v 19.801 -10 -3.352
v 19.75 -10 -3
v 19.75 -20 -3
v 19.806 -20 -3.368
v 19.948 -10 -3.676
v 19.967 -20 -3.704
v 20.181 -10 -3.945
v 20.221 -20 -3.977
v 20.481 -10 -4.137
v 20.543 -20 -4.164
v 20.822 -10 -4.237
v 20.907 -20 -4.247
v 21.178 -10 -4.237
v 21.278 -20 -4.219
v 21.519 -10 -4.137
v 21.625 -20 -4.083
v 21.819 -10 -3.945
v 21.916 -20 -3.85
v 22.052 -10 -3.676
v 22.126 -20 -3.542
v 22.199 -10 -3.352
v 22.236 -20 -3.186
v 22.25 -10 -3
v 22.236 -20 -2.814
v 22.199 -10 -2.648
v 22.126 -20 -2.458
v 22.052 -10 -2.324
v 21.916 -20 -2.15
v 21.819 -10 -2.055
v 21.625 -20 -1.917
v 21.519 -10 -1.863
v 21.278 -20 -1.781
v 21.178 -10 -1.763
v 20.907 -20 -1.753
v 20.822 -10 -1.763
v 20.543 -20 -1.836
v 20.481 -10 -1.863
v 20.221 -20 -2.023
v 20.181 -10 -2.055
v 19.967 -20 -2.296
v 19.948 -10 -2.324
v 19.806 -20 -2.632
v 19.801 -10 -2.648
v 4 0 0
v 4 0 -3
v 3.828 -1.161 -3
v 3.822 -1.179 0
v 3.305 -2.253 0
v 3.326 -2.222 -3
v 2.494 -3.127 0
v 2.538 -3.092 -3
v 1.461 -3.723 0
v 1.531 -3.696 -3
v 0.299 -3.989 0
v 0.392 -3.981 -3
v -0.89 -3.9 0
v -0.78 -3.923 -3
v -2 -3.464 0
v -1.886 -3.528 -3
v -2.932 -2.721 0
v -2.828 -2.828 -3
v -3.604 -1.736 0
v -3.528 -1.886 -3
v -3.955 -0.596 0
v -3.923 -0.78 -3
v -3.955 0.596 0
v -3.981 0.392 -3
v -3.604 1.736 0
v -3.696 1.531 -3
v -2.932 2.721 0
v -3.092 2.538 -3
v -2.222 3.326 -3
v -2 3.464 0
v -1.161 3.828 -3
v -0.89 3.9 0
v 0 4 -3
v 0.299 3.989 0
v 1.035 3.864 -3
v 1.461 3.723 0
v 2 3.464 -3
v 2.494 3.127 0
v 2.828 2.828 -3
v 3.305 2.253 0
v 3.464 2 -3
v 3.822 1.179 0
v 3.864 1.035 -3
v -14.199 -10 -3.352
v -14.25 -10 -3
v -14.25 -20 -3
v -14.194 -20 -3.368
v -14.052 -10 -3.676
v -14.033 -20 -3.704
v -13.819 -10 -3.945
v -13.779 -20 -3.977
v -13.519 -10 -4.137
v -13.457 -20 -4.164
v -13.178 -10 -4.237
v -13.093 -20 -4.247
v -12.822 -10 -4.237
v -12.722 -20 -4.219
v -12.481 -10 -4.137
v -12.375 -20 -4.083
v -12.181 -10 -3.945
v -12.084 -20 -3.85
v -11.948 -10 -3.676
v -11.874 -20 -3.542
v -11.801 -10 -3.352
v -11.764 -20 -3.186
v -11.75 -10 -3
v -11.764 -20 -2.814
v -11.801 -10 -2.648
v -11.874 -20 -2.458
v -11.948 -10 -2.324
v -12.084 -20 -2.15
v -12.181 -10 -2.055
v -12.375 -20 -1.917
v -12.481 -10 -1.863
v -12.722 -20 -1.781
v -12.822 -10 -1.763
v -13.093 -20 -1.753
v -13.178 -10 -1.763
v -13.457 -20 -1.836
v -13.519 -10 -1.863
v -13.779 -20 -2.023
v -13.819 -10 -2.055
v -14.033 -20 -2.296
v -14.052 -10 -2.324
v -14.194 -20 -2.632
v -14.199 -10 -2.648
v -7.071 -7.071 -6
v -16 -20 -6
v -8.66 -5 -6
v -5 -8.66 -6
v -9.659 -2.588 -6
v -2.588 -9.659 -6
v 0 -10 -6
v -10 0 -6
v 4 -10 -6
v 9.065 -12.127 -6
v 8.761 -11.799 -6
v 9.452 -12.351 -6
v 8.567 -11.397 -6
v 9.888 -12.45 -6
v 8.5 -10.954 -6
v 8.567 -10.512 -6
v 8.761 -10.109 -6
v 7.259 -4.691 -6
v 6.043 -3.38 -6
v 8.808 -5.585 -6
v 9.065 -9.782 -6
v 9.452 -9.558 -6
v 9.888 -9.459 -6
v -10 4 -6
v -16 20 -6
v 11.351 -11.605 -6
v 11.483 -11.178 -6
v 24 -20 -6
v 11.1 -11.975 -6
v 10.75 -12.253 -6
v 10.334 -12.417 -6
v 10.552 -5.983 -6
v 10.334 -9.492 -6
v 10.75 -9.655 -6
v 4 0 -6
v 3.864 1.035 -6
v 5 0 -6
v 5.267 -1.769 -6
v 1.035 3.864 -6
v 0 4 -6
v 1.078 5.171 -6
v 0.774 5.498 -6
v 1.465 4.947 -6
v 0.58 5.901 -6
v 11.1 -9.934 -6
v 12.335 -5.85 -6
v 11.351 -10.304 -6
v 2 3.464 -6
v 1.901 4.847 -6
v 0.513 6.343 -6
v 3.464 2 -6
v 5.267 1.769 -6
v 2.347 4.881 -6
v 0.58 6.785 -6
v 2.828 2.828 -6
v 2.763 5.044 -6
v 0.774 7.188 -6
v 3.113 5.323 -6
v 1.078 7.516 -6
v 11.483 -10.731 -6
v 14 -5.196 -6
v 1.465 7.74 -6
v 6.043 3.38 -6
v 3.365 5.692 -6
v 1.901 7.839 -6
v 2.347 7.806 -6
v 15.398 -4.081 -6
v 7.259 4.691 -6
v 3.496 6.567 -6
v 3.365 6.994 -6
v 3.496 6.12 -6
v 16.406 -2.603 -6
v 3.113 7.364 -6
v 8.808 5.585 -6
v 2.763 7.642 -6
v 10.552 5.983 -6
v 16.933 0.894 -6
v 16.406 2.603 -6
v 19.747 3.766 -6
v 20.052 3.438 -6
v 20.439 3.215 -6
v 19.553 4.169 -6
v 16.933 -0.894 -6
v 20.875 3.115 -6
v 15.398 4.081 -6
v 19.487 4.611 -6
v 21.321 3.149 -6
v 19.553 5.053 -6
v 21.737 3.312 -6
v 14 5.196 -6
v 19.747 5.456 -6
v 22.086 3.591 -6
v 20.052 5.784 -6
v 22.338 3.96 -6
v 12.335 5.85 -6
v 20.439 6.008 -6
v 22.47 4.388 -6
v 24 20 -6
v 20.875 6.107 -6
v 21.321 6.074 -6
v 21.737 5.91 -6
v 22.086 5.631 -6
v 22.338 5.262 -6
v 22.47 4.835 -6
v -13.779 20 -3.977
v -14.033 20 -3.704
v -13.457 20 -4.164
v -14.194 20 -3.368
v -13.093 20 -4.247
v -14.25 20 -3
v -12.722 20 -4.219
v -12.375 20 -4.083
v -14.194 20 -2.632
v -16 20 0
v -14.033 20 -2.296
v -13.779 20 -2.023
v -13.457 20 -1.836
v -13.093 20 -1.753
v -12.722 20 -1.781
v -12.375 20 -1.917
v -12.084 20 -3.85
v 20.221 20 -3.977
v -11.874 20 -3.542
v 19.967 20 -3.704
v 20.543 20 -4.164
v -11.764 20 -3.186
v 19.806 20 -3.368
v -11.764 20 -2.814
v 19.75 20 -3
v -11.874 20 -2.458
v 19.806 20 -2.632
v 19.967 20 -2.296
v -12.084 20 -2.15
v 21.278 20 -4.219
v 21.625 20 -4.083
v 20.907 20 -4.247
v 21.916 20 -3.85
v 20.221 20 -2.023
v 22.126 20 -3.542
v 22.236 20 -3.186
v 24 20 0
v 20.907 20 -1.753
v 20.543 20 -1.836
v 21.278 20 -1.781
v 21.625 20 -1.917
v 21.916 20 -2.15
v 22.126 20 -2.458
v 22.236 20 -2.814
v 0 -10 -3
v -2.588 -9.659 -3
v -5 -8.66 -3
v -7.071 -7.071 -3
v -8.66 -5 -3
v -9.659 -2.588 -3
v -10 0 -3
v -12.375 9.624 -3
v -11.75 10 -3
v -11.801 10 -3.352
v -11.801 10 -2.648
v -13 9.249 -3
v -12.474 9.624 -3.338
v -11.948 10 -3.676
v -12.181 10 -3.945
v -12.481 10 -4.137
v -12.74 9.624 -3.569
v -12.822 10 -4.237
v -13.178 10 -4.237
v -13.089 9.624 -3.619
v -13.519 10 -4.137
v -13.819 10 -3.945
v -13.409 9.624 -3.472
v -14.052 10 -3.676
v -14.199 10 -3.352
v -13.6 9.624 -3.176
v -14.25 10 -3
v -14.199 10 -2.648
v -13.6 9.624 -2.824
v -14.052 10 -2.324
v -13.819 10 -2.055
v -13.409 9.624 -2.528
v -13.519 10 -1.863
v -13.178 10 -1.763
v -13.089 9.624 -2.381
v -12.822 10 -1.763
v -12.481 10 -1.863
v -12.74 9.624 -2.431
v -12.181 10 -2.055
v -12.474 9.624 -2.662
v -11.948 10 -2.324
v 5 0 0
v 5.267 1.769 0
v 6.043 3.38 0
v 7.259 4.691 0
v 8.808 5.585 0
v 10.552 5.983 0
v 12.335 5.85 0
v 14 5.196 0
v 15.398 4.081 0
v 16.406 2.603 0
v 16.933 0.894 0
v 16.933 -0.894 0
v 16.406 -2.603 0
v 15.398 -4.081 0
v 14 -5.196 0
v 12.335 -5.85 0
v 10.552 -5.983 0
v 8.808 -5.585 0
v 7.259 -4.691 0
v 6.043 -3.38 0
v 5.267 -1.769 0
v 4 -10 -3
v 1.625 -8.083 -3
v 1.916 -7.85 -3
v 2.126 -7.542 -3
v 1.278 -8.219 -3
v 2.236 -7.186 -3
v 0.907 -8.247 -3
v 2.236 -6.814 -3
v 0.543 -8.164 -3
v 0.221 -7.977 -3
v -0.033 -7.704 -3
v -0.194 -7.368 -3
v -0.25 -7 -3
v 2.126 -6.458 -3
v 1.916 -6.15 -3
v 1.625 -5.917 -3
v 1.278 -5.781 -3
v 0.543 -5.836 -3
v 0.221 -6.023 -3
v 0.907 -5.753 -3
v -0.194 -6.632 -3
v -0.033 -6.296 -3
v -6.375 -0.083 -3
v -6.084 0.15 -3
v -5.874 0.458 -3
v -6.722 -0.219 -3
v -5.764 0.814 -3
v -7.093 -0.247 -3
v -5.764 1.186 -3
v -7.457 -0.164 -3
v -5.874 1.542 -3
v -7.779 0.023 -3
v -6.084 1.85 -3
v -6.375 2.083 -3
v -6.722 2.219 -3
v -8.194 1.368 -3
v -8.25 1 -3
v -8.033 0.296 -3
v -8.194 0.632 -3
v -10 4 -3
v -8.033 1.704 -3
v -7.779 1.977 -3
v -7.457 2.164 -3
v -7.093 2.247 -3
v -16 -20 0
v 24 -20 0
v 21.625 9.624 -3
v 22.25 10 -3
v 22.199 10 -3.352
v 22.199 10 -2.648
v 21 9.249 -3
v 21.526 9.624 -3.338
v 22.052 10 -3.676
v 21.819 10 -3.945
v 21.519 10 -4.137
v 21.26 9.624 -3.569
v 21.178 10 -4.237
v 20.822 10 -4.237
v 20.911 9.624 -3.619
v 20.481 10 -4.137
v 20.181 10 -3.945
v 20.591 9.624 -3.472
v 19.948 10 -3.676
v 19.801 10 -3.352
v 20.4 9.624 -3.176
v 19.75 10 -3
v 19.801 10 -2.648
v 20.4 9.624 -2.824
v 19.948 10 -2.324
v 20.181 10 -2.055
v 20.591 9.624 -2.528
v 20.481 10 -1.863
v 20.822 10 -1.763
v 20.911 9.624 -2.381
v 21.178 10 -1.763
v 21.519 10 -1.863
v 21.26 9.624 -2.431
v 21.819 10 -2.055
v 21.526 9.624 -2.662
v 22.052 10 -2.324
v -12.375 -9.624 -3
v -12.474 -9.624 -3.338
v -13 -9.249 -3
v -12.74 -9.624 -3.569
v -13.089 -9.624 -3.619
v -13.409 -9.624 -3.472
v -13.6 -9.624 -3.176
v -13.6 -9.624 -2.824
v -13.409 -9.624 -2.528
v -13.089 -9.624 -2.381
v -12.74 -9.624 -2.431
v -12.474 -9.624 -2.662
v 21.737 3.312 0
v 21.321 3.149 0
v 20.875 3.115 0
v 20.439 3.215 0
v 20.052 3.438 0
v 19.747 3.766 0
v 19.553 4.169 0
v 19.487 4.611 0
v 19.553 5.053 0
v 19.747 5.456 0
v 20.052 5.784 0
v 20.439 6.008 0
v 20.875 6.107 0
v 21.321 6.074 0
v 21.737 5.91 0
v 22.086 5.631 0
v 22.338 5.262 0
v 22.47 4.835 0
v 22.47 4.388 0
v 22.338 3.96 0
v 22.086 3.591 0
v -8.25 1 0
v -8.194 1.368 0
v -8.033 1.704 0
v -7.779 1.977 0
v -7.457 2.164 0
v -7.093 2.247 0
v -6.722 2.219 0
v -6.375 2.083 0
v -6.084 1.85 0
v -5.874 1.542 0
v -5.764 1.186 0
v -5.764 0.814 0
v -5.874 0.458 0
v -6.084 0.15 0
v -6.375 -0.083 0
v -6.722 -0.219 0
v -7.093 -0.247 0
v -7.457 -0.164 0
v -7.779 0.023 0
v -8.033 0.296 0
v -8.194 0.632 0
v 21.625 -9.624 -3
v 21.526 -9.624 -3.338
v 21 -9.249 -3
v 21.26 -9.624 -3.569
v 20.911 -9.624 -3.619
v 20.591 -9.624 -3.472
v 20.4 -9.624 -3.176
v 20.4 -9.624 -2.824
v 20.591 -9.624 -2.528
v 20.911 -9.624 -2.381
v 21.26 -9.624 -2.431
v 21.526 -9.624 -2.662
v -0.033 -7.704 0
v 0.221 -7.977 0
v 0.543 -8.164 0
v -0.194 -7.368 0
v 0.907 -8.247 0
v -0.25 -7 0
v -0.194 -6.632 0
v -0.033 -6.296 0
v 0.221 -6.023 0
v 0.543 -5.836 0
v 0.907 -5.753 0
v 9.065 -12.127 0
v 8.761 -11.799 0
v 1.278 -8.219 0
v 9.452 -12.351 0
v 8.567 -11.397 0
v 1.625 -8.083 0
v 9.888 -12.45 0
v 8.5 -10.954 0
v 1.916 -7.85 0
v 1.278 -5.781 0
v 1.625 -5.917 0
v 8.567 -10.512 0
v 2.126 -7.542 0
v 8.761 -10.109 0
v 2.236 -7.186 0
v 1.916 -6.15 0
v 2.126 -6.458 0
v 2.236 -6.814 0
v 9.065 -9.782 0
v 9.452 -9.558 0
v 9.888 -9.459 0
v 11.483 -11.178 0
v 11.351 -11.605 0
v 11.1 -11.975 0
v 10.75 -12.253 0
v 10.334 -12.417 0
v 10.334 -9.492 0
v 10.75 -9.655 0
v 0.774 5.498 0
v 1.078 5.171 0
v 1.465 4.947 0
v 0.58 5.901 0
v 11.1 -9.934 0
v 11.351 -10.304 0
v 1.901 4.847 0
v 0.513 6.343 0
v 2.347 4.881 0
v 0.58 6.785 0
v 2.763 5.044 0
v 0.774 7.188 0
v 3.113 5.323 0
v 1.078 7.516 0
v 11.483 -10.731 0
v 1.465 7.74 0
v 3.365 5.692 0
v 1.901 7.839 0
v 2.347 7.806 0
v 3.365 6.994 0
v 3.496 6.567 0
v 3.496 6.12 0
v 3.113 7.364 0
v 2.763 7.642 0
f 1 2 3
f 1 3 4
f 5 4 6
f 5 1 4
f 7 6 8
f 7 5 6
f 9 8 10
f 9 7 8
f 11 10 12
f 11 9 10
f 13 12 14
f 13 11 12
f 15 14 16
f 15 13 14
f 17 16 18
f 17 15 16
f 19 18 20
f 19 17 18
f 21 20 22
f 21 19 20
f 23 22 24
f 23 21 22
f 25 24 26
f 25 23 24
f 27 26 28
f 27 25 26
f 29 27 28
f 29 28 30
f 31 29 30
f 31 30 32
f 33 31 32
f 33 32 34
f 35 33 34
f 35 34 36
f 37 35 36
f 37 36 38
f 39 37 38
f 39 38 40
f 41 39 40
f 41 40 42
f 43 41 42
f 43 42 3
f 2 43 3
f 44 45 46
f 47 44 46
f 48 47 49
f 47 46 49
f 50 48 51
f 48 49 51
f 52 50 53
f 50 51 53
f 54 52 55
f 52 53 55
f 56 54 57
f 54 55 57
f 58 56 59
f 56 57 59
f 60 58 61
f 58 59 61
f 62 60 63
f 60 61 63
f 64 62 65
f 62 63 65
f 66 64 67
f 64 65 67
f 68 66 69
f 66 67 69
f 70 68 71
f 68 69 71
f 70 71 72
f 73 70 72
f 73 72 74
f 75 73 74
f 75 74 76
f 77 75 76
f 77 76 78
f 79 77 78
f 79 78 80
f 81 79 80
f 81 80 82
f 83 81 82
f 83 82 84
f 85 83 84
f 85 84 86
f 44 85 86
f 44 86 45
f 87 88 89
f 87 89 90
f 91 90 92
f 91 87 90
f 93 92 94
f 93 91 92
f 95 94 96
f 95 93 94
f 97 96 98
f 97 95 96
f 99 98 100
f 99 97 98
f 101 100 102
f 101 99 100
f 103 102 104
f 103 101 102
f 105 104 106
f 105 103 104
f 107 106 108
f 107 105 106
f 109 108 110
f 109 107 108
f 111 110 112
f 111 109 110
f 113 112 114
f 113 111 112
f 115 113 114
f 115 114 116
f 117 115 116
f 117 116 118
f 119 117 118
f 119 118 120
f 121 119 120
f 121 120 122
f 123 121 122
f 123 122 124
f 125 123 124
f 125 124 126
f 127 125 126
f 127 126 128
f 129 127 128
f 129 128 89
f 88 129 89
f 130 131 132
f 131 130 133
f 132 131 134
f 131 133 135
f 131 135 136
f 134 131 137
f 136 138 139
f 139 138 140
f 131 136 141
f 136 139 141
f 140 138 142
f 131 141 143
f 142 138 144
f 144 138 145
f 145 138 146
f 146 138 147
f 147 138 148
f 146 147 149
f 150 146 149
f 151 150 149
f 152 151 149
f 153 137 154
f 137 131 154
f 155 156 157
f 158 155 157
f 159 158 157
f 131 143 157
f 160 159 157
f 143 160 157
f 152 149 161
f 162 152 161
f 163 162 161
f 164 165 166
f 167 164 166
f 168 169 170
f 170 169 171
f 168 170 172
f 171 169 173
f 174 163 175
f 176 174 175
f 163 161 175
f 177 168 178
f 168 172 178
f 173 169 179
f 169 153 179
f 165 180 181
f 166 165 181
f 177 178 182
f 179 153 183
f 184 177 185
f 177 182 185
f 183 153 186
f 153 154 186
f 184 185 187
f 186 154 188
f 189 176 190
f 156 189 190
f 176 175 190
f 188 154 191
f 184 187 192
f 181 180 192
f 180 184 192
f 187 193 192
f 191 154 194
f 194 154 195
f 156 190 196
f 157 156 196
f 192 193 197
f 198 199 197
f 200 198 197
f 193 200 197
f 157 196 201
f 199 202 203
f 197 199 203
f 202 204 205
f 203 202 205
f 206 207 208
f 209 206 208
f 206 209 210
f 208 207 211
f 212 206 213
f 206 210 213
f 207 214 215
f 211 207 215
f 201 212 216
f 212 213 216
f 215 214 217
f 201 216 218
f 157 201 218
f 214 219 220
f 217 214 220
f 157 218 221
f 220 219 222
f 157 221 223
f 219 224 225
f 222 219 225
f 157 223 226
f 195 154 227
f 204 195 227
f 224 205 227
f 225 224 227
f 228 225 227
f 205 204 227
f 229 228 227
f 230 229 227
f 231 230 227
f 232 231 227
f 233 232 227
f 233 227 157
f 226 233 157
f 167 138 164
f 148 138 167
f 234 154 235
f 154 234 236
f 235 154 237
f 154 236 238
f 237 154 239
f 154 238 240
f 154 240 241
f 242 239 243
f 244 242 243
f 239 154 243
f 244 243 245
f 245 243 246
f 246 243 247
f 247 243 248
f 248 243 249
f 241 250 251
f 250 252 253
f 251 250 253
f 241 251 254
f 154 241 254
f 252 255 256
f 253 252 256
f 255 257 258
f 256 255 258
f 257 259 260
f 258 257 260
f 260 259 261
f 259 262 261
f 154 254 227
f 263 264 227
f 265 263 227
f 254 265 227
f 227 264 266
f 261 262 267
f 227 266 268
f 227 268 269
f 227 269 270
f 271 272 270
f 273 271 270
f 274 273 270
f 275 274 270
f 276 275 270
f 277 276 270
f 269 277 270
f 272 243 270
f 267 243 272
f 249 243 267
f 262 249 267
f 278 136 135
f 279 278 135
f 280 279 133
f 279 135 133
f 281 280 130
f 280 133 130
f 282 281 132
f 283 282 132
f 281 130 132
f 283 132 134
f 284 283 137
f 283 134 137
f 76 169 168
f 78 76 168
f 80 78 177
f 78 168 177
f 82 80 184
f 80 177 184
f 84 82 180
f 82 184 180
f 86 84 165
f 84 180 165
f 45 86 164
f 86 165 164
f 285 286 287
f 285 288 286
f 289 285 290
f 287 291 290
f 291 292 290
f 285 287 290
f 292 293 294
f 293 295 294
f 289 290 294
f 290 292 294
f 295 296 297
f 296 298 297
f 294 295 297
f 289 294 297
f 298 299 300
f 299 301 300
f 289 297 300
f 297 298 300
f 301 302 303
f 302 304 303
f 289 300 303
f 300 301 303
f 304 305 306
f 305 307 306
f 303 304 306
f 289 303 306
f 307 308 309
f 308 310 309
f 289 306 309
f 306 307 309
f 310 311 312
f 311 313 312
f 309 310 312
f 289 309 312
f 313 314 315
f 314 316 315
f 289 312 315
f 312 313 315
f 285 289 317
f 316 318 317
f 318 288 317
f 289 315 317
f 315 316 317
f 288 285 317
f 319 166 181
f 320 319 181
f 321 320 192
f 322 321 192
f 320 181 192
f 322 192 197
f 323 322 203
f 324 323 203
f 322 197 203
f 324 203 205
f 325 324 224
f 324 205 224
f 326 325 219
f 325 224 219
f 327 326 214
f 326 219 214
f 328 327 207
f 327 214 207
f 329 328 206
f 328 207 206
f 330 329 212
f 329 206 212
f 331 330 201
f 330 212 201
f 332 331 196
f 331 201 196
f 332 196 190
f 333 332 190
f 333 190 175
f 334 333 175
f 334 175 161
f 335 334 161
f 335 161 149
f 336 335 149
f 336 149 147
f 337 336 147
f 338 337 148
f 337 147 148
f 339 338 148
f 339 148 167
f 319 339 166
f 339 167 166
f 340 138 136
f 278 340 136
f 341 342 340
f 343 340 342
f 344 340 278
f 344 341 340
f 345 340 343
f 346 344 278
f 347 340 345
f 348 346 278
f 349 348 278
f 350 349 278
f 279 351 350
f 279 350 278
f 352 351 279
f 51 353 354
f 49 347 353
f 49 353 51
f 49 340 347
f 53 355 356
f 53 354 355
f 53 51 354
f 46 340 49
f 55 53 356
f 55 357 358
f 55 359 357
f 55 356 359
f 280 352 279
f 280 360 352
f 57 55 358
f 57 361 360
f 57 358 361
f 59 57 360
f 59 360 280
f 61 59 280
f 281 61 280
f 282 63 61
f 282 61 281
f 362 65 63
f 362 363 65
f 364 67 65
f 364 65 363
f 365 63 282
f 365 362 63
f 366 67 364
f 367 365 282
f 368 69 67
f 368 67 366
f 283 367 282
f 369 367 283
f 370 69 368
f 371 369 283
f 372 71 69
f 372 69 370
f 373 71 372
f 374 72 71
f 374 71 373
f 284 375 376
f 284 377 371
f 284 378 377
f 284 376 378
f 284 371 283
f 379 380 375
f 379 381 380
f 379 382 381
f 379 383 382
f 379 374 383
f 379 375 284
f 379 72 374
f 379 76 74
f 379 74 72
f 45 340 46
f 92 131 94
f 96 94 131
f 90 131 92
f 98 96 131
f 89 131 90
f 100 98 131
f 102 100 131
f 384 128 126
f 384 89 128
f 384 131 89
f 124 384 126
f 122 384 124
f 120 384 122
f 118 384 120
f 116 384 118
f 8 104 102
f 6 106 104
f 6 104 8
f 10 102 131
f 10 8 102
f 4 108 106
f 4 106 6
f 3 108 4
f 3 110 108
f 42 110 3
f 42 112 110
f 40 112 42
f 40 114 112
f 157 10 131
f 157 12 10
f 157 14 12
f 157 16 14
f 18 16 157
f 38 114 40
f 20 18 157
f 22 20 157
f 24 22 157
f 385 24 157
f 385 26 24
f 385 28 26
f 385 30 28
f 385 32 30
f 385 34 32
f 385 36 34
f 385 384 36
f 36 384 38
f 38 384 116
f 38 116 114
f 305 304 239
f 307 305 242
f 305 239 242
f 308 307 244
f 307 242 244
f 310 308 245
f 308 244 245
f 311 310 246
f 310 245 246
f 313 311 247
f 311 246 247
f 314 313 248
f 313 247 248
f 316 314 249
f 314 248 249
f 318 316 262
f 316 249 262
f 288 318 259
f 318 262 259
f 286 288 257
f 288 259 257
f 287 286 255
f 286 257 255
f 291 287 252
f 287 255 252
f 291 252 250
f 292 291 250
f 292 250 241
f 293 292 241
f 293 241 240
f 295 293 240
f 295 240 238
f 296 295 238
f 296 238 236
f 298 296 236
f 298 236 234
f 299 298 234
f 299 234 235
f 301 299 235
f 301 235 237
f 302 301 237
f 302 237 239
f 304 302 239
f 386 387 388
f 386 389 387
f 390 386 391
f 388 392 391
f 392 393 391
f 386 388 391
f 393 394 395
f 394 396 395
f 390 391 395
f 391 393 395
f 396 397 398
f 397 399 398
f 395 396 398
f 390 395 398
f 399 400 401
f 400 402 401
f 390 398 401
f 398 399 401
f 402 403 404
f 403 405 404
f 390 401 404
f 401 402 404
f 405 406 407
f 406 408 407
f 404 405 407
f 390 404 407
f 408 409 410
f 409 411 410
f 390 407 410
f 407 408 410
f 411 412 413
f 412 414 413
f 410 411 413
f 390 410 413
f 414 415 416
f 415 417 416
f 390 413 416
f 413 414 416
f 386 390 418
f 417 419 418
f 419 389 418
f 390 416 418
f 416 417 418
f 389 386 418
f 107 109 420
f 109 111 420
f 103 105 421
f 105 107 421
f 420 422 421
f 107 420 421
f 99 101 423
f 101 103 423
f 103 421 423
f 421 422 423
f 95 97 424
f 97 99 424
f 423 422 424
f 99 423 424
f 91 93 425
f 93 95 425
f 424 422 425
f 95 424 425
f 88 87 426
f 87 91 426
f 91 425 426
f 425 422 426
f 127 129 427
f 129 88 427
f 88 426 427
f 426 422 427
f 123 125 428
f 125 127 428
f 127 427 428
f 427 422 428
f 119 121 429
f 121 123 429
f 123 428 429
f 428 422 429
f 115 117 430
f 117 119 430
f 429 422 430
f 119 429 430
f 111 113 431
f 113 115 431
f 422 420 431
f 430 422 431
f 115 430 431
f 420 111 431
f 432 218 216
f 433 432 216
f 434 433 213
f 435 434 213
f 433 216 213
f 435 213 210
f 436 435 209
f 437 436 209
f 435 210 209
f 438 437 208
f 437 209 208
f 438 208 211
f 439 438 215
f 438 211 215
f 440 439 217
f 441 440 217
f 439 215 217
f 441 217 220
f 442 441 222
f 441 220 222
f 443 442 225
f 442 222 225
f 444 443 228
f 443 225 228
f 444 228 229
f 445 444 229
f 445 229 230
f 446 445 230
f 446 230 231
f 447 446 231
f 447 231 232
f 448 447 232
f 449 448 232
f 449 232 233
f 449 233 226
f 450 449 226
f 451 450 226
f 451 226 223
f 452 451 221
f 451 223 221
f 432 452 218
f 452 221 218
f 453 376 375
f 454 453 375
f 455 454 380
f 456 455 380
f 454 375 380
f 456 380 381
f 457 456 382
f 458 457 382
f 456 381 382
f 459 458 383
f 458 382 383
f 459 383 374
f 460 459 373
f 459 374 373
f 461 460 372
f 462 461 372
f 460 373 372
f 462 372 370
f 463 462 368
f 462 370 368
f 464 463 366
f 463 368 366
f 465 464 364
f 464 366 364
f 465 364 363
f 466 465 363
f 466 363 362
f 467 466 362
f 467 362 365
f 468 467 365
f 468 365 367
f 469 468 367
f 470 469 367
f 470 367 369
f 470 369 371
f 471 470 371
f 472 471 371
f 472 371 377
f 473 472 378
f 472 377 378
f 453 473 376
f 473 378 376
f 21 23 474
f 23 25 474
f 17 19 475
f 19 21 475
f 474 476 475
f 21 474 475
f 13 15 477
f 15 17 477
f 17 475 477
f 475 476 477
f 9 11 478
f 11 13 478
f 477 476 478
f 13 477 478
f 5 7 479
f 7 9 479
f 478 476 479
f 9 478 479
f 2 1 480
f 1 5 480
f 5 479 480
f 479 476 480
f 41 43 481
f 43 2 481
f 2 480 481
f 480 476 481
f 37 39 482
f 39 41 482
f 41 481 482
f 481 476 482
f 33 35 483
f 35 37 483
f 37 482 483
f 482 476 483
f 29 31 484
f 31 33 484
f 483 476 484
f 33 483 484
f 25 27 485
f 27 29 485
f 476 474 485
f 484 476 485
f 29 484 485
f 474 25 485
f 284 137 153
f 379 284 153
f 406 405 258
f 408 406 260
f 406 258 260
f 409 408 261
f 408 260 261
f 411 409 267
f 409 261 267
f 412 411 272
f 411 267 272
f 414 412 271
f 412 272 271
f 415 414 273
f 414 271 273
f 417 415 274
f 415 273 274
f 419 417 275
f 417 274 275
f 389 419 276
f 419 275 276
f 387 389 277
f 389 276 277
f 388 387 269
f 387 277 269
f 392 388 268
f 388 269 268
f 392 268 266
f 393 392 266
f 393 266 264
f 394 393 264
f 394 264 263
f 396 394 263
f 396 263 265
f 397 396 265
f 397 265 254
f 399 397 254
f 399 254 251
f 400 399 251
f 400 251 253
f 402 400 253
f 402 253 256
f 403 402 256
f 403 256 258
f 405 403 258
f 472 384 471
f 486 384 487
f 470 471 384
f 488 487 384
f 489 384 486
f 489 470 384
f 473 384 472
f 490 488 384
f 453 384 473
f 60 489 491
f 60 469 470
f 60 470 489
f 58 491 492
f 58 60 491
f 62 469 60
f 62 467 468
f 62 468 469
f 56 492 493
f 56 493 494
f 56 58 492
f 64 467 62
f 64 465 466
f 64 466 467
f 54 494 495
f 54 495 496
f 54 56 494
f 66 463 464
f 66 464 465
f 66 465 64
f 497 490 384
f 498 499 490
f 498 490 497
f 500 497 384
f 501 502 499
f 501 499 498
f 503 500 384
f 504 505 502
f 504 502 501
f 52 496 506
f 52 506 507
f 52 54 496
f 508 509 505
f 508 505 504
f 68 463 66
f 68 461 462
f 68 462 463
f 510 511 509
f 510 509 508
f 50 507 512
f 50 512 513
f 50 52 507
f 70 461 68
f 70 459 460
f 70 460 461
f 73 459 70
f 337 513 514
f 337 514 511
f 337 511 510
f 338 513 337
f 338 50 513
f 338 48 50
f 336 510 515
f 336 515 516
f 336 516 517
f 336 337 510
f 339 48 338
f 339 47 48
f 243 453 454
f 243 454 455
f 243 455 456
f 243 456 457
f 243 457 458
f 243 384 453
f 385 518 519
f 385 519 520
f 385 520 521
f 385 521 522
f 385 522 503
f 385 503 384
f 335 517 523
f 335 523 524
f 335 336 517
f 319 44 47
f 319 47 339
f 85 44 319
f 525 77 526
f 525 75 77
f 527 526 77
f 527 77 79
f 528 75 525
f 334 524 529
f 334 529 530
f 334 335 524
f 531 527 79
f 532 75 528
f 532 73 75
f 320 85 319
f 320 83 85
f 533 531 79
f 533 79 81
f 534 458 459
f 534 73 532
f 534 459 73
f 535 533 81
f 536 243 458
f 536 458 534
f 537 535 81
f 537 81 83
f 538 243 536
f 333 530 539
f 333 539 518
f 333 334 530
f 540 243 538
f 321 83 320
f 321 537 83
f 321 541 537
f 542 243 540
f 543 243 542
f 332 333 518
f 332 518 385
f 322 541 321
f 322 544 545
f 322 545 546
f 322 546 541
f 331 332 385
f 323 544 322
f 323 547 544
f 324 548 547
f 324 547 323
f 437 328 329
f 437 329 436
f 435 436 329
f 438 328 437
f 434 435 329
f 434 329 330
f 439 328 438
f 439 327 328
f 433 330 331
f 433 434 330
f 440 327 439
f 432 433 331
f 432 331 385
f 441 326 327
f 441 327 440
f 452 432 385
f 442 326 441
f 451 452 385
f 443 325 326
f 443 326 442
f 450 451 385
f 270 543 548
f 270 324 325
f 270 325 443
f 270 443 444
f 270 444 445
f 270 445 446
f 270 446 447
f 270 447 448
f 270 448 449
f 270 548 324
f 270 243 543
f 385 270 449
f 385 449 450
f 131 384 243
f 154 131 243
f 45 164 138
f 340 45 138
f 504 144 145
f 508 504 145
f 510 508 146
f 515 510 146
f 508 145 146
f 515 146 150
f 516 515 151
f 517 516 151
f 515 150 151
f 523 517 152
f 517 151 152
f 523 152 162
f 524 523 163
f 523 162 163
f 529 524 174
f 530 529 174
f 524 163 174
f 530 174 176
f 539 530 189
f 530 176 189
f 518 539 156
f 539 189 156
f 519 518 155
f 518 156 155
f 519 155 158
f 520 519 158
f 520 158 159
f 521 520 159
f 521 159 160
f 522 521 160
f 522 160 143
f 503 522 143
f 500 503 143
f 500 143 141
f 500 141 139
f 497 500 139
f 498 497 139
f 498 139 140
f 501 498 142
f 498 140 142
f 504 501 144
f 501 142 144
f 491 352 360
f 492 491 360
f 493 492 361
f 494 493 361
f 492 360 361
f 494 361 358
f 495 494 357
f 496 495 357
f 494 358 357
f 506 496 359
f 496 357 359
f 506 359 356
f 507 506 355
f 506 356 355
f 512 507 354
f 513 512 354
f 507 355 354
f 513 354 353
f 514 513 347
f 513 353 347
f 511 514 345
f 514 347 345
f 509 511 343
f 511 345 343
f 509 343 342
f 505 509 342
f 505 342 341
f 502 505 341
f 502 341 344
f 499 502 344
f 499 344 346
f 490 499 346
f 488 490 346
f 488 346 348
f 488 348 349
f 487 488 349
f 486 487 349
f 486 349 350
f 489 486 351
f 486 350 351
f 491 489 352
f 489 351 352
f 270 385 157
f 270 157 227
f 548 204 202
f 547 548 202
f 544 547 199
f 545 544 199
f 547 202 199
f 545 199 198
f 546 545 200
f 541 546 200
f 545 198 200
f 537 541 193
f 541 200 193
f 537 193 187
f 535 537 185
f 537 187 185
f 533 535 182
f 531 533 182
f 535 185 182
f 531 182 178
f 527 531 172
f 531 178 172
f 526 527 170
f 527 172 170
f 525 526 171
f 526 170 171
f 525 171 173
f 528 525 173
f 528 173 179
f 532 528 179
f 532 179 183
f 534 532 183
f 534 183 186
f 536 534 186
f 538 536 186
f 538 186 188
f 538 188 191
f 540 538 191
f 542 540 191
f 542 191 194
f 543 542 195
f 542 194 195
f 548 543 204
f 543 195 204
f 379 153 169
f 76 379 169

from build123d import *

# Parameters (mm, degrees)
SKETCH1_W           = 40
SKETCH1_H           = 40
EXTRUDE1_DEPTH      = 6
SKETCH8_R           = 6
CUT_EXTRUDE6_DEPTH  = 6
SKETCH5_R           = 1.5
CUT_EXTRUDE4_DEPTH  = 6
CIRPATTERN1_COUNT   = 3
CUT_EXTRUDE13_DEPTH = 3
SKETCH20_R          = 4
CUT_EXTRUDE14_DEPTH = 3
SKETCH25_R          = 1.25
EXTRUDE4_DEPTH      = 3
SKETCH27_R          = 1.25
EXTRUDE9_DEPTH      = 10
EXTRUDE7_START      = -10
SKETCH29_R          = 1.25
EXTRUDE7_DEPTH      = 10


# Read off the part's stored shape, not the designer's step: M3 Tapped Hole1
with BuildPart() as part:
    # Sketch1 → Extrude1 (new body)
    with BuildSketch(Plane.XY):
        with Locations((4, 0)):
            Rectangle(SKETCH1_W, SKETCH1_H)
    extrude(amount=-EXTRUDE1_DEPTH)

    # Sketch8 → Cut-Extrude6 (cut)
    with BuildSketch(Plane(origin=(0, 0, -6), x_dir=(-1, 0, 0), z_dir=(0, 0, -1))):
        with Locations((-11, 0)):
            Circle(SKETCH8_R)
    extrude(amount=-CUT_EXTRUDE6_DEPTH, mode=Mode.SUBTRACT)

    # Sketch5 → Cut-Extrude4 (cut)
    with BuildSketch(Plane(origin=(0, 0, -6), x_dir=(-1, 0, 0), z_dir=(0, 0, -1))):
        with Locations((-10, -10.95445115)):
            Circle(SKETCH5_R)
    cut_extrude4 = extrude(amount=-CUT_EXTRUDE4_DEPTH, mode=Mode.SUBTRACT)

    # CirPattern1: Cut-Extrude4 ×3 about axis
    cirpattern1_axis = Axis((11, 0, 0), (0, 0, 1))
    for i in range(1, CIRPATTERN1_COUNT):
        add(cut_extrude4.rotate(cirpattern1_axis, i * 360 / CIRPATTERN1_COUNT), mode=Mode.SUBTRACT)

    # Sketch19 → Cut-Extrude13 (cut)
    with BuildSketch(Plane(origin=(0, 0, -6), x_dir=(-1, 0, 0), z_dir=(0, 0, -1))):
        with BuildLine():
            Line((10, 4), (0, 4))
            ThreePointArc((0, 4), (-2.828427125, 2.828427125), (-4, 0))
            Line((-4, 0), (-4, -10))
            Line((-4, -10), (0, -10))
            ThreePointArc((0, -10), (7.071067812, -7.071067812), (10, 0))
            Line((10, 0), (10, 4))
        make_face()
    extrude(amount=-CUT_EXTRUDE13_DEPTH, mode=Mode.SUBTRACT)

    # Sketch20 → Cut-Extrude14 (cut)
    with BuildSketch(Plane(origin=(0, 0, -3), x_dir=(-1, 0, 0), z_dir=(0, 0, -1))):
        with Locations(Location((0, 0, 0), (0, 0, 180))):
            Circle(SKETCH20_R)
    extrude(amount=-CUT_EXTRUDE14_DEPTH, mode=Mode.SUBTRACT)

    # Sketch25 → Extrude4 (cut)
    with BuildSketch(Plane(origin=(0, 0, -3), x_dir=(-1, 0, 0), z_dir=(0, 0, -1))):
        with Locations((-1, -7)):
            Circle(SKETCH25_R)
        with Locations((7, 1)):
            Circle(SKETCH25_R)
    extrude(amount=-EXTRUDE4_DEPTH, mode=Mode.SUBTRACT)

    # Sketch27 → Extrude9 (cut)
    with BuildSketch(Plane(origin=(0, 20, 0), x_dir=(1, 0, 0), z_dir=(0, 1, 0))):
        with Locations(Location((-13, 3, 0), (0, 0, 180))):
            Circle(SKETCH27_R)
        with Locations(Location((21, 3, 0), (0, 0, 180))):
            Circle(SKETCH27_R)
    extrude(amount=-EXTRUDE9_DEPTH, mode=Mode.SUBTRACT)

    # Sketch29 → Extrude7 (cut)
    with BuildSketch(Plane.XZ.offset(20).offset(EXTRUDE7_START)):
        with Locations(Location((-13, -3, 0), (0, 0, 180))):
            Circle(SKETCH29_R)
        with Locations(Location((21, -3, 0), (0, 0, 180))):
            Circle(SKETCH29_R)
    extrude(amount=EXTRUDE7_DEPTH, mode=Mode.SUBTRACT)

    # M3 Tapped Hole1 outline → M3 Tapped Hole1 (revolve, cut)
    with BuildSketch(Plane(origin=(-13, 0, -3), x_dir=(1, 0, 0), z_dir=(0, 0, 1))):
        Polygon((1.25, -10), (0, -9.248924226), (0, -10), align=None)
        Polygon((0, 10), (0, 9.248924226), (1.25, 10), align=None)
    revolve(axis=Axis((-13, 0, -3), (0, 1, 0)), mode=Mode.SUBTRACT)

    # M3 Tapped Hole1 2 outline → M3 Tapped Hole1 2 (revolve, cut)
    with BuildSketch(Plane(origin=(21, 0, -3), x_dir=(1, 0, 0), z_dir=(0, 0, 1))):
        Polygon((1.25, -10), (0, -9.248924226), (0, -10), align=None)
        Polygon((0, 10), (0, 9.248924226), (1.25, 10), align=None)
    revolve(axis=Axis((21, 0, -3), (0, 1, 0)), mode=Mode.SUBTRACT)


solid = part.part
